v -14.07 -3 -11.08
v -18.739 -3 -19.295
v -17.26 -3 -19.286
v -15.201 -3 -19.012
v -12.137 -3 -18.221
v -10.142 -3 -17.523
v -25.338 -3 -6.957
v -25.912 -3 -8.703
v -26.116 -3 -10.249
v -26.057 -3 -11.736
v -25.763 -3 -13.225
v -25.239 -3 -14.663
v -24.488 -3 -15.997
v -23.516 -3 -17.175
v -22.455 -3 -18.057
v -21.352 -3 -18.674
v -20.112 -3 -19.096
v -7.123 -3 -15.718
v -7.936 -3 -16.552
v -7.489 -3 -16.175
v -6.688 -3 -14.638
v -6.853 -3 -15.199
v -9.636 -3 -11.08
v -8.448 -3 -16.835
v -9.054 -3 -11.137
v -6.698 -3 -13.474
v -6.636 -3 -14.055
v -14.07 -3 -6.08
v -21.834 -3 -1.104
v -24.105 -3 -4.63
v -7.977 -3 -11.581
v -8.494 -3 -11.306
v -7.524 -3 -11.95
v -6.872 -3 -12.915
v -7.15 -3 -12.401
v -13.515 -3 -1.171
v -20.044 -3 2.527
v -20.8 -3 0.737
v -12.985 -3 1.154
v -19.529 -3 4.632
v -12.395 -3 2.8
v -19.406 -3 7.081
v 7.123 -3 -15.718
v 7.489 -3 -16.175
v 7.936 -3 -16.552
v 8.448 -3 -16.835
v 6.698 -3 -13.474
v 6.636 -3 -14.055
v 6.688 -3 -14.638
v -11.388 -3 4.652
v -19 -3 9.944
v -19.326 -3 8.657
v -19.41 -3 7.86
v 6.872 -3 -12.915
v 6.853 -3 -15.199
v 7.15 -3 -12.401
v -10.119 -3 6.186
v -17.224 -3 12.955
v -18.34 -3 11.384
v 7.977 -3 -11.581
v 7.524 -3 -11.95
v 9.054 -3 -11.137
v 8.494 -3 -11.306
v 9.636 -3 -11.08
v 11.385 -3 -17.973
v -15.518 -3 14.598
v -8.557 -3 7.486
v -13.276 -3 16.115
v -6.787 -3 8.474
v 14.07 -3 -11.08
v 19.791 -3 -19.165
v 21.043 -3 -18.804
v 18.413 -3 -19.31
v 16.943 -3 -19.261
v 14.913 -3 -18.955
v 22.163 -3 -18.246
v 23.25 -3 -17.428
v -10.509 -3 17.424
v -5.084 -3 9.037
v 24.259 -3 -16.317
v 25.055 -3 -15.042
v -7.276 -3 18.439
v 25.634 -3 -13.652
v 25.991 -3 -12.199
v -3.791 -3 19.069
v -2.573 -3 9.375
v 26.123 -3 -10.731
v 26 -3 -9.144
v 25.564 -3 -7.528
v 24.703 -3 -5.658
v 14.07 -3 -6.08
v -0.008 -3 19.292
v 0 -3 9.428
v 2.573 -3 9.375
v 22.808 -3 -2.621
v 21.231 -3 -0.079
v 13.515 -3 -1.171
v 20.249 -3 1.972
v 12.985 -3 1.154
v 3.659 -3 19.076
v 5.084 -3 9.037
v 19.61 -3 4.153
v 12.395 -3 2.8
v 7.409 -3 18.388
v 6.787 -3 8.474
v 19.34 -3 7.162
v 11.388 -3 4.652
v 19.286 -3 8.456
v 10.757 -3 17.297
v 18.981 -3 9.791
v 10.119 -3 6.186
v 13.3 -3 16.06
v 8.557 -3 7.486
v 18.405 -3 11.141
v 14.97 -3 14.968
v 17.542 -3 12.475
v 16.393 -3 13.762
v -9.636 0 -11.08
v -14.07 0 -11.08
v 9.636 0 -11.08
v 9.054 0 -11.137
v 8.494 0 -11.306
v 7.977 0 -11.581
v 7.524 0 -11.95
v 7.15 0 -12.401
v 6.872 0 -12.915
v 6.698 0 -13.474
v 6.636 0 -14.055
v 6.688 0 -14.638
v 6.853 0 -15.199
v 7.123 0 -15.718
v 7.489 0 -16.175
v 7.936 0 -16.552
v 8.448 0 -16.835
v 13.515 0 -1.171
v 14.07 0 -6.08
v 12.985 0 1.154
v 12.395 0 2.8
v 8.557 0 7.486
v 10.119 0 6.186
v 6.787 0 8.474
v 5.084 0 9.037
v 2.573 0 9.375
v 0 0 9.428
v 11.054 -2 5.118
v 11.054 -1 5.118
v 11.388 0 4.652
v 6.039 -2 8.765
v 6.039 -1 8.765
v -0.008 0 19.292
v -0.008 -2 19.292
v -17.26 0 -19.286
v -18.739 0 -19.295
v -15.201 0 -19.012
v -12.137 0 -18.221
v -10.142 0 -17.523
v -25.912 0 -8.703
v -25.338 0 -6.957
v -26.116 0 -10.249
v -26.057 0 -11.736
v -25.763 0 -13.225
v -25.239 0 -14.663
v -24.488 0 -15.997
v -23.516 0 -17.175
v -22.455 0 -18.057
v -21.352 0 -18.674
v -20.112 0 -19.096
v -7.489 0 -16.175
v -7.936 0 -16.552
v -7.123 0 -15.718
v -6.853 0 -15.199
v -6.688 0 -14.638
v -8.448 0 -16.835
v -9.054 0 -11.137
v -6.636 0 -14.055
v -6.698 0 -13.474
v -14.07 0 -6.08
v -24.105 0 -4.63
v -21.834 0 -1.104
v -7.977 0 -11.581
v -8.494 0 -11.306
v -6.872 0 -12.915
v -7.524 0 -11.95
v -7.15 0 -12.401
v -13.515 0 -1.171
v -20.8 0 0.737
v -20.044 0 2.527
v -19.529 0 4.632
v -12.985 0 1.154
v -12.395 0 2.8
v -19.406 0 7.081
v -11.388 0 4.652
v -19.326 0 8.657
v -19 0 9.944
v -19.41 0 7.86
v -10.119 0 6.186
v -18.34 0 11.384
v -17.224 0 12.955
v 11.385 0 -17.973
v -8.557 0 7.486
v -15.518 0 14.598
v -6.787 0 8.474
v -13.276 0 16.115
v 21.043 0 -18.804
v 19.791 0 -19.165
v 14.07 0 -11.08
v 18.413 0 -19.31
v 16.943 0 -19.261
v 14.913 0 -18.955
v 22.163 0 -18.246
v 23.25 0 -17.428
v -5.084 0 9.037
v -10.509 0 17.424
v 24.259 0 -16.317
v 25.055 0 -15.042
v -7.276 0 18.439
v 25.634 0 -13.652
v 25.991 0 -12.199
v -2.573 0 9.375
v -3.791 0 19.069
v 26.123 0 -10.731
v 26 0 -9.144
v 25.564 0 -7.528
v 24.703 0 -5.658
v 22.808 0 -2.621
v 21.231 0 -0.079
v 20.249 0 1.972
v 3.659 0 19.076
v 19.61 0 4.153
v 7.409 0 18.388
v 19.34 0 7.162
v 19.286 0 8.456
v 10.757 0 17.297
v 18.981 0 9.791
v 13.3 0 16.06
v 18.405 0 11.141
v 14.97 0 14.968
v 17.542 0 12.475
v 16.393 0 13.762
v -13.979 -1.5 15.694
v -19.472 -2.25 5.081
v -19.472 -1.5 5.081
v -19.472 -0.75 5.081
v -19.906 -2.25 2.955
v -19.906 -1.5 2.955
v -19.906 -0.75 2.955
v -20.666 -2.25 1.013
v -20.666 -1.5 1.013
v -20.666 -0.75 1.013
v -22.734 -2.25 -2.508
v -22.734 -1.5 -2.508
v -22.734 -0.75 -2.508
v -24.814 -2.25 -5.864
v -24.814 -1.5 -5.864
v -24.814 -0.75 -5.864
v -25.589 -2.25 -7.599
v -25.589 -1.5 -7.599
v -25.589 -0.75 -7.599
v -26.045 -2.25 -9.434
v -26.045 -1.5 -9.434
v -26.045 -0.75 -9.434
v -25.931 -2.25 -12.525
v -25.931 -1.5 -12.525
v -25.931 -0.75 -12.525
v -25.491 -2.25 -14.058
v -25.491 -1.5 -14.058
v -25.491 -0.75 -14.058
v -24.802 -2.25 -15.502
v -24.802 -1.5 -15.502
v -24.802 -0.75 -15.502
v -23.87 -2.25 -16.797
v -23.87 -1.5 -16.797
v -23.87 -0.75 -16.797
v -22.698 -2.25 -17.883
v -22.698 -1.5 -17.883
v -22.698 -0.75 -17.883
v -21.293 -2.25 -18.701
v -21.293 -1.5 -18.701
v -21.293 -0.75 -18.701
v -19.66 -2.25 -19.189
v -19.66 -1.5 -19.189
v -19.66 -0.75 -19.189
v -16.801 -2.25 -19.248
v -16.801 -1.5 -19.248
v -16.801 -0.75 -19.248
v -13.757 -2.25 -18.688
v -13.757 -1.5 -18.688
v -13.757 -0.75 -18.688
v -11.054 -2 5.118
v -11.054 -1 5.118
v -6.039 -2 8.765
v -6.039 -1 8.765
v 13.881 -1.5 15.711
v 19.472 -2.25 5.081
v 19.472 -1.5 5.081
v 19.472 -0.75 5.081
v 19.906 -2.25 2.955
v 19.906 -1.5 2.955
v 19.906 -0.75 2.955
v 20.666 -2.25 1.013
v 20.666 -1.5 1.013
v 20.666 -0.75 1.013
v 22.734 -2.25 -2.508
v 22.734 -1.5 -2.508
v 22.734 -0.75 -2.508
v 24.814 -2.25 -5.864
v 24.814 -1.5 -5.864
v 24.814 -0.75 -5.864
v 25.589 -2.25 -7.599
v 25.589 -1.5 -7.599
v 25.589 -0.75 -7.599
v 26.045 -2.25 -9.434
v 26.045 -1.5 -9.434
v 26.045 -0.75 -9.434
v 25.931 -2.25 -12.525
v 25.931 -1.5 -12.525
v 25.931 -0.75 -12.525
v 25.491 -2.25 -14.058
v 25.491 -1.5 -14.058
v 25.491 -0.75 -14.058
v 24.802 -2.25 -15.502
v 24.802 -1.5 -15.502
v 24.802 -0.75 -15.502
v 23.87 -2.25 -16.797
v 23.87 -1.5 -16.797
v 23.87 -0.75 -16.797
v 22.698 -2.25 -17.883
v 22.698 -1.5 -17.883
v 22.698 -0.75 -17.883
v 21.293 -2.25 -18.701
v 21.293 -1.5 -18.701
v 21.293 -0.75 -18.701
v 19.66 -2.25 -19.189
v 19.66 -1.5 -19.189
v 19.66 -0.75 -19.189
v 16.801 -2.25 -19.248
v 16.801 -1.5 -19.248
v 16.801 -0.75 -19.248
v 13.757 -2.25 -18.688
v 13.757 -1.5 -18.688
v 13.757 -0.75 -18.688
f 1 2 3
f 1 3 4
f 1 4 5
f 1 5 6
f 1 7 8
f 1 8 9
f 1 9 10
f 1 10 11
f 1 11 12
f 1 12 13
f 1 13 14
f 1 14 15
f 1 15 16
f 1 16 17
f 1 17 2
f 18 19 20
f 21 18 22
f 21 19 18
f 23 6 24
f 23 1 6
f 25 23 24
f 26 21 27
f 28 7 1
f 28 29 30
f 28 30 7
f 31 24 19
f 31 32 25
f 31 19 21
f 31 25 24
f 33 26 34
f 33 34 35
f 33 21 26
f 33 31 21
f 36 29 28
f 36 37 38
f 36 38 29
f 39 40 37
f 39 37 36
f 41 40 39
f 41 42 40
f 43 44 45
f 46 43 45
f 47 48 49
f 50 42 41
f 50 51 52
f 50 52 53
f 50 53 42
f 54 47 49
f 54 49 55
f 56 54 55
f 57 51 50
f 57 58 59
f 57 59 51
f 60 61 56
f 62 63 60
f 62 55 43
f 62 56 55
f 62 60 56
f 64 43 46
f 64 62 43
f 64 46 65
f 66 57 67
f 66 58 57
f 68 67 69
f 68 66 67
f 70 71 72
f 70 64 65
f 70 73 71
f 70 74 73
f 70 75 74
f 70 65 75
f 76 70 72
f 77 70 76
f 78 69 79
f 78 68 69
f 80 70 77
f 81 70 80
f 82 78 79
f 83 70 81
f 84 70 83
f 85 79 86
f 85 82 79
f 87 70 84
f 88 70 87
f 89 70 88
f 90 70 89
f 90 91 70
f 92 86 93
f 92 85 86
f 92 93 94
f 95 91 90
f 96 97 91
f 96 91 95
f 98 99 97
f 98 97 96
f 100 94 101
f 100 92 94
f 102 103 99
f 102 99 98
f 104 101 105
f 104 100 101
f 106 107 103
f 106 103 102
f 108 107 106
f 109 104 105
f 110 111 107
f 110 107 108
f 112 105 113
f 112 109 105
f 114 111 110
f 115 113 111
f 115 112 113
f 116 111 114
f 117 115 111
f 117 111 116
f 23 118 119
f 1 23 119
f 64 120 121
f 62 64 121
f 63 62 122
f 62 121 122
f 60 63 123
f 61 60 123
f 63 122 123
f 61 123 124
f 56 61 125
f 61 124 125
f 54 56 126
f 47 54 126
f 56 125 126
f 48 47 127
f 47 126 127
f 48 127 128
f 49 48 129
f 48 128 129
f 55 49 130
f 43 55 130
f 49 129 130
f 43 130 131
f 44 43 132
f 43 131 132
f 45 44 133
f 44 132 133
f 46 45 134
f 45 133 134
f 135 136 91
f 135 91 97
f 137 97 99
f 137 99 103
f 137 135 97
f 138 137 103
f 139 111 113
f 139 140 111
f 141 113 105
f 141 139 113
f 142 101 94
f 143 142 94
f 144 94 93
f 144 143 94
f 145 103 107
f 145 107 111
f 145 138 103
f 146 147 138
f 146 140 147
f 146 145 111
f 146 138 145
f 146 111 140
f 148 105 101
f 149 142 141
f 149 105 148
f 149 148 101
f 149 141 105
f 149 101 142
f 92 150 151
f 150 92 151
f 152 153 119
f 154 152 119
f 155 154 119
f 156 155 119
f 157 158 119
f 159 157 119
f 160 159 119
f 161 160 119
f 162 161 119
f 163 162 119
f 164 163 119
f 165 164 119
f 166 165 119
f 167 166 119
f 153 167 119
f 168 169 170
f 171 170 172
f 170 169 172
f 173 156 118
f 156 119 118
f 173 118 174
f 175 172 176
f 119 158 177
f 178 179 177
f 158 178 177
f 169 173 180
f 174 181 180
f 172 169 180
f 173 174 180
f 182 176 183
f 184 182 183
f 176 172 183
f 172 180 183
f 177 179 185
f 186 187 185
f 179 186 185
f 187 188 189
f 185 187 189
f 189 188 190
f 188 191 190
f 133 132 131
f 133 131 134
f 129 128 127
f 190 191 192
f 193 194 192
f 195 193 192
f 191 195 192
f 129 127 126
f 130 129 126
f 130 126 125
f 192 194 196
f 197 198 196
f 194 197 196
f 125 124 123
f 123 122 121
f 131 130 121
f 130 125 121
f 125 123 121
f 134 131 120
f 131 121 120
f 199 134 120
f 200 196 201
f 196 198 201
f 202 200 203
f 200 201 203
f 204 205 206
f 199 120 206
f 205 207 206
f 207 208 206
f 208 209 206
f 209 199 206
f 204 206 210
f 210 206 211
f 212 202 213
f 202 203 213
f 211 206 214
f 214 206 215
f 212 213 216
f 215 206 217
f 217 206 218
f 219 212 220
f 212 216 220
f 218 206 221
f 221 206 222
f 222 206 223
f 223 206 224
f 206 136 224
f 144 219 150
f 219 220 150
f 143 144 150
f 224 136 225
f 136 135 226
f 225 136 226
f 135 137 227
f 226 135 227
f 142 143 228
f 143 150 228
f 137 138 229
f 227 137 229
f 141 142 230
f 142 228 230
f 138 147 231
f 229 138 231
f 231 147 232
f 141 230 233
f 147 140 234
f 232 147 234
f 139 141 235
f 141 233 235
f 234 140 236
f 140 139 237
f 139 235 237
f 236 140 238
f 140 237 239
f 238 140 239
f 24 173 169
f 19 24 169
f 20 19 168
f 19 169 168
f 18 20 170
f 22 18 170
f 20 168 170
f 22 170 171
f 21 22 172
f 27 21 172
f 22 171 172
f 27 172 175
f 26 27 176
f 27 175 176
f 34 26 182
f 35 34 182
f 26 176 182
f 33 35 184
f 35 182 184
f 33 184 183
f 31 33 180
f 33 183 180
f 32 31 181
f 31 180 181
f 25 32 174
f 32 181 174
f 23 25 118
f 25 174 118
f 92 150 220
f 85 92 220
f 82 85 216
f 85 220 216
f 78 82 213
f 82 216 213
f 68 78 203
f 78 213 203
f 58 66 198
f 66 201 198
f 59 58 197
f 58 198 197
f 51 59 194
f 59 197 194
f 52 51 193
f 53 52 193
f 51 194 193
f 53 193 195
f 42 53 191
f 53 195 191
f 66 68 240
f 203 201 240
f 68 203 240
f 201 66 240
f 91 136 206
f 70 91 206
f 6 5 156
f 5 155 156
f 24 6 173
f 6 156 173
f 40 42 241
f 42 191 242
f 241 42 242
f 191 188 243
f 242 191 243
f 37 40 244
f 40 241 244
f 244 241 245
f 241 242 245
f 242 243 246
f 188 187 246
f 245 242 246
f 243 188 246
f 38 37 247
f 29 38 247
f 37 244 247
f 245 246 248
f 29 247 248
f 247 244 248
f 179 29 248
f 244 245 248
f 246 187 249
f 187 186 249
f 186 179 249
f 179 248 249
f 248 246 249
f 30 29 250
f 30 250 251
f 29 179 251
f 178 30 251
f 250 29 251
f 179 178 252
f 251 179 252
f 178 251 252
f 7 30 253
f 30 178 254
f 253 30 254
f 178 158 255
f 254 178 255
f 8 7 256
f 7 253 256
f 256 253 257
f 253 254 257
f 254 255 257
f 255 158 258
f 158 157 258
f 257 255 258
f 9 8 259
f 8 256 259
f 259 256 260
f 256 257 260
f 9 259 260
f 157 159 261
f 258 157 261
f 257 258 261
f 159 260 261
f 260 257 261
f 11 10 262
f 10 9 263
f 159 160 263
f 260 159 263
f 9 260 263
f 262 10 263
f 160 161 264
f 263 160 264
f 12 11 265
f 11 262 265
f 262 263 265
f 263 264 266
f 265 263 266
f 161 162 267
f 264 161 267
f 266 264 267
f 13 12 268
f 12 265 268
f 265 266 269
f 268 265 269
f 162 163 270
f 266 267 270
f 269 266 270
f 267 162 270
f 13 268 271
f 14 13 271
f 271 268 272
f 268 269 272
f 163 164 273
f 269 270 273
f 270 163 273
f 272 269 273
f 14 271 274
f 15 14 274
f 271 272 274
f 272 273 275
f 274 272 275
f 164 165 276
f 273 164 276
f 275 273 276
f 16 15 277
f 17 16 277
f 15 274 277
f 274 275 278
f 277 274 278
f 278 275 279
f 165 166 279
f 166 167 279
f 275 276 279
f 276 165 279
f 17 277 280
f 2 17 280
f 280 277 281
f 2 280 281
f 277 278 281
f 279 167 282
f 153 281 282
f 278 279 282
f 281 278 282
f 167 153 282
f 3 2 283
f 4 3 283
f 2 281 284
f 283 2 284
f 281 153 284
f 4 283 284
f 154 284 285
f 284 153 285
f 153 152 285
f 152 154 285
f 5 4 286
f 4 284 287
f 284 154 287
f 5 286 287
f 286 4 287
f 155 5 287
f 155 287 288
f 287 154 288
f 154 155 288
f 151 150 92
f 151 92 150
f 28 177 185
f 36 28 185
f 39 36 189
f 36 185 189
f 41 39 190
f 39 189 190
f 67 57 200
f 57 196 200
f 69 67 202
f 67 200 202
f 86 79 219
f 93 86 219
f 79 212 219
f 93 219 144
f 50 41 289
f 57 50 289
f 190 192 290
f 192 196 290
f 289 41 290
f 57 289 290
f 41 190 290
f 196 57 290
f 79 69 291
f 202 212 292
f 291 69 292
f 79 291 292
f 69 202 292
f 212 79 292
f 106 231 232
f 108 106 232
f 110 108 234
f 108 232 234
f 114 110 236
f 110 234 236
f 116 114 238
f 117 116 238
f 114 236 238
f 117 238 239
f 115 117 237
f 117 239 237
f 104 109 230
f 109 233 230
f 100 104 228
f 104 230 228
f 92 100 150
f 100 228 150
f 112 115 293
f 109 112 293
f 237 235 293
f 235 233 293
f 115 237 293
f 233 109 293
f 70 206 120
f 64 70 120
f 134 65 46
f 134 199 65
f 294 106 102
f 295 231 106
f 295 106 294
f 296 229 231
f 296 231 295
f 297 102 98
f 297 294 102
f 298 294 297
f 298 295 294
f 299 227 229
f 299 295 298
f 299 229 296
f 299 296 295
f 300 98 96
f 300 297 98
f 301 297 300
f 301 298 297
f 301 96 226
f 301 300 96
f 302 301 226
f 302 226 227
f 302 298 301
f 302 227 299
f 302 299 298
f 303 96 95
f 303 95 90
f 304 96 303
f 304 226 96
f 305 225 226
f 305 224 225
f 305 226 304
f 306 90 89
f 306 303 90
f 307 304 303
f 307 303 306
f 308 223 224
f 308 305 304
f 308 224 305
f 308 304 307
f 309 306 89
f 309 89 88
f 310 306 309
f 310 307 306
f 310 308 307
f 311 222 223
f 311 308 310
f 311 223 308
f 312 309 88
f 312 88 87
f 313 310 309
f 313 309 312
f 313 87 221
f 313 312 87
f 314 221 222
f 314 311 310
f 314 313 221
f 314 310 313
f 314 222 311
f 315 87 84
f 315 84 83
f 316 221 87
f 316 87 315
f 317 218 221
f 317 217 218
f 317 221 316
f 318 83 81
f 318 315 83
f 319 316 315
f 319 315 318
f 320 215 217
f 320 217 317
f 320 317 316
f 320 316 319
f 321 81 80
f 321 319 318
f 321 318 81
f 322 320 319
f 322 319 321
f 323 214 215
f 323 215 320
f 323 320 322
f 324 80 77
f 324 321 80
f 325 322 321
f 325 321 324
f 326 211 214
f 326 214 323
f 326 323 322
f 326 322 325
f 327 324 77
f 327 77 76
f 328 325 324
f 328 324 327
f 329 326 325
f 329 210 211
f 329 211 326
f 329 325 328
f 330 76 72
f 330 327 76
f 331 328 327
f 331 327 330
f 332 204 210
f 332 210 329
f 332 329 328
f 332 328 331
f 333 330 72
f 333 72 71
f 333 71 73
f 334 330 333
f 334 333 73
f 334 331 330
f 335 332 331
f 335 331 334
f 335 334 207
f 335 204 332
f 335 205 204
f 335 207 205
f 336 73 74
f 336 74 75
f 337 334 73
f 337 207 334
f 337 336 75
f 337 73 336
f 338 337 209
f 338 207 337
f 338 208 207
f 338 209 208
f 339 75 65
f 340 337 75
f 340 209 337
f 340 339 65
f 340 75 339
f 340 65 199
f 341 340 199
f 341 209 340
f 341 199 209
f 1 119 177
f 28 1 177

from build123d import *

# Parameters (mm, degrees)
F1_DEPTH = 3


# Not quite as in the source:
# - ends of sketch curves that miss each other by under 0.0002 mm in the source are joined
# - the dataset's text gives a spline's control points without its knots; the knots are read off the source's solid


with BuildPart() as f1:
    # F0 (on Front) → F1 (new body)
    with BuildSketch(Plane.XZ):
        with BuildLine():
            Line((-9.636137, -11.080088), (-14.07, -11.080088))
            Line((-14.07, -11.080088), (-14.07, -6.080088))
            add(Edge.make_bspline(
                [(-14.07, -6.080088), (-13.725678, -2.009613), (-13.197272, 4.237053), (-6.222695, 9.414593), (-2.060159, 9.423293), (0, 9.427599)],
                knots=[0, 0, 0, 0, 11.597106, 17.797245, 23.872878, 23.872878, 23.872878, 23.872878], degree=3))
            add(Edge.make_bspline(
                [(14.07, -6.080088), (13.725679, -2.009613), (13.197273, 4.237053), (6.222696, 9.414593), (2.06016, 9.423293), (0, 9.427599)],
                knots=[0, 0, 0, 0, 11.597106, 17.797245, 23.872878, 23.872878, 23.872878, 23.872878], degree=3))
            Line((14.07, -6.080088), (14.07, -11.080088))
            Line((14.07, -11.080088), (9.636138, -11.080088))
            ThreePointArc((9.636138, -11.080088), (6.6980962866, -13.4735314153), (8.4480789685, -16.8348140731))
            add(Edge.make_bspline(
                [(19.339969, 7.161527), (19.387769, 6.678303), (19.412006, -0.419852), (29.48044, -7.102045), (22.588634, -22.151196), (11.198451, -18.020996), (8.4480789685, -16.8348140731)],
                knots=[26.688985, 26.688985, 26.688985, 26.688985, 28.557776, 42.872008, 54.1154, 62.665306, 62.665306, 62.665306, 62.665306], degree=3))
            add(Edge.make_bspline(
                [(19.339969, 7.161527), (19.9265814181, 19.2748150047), (-0.0078359998, 19.2919222589)],
                knots=[6.253754, 6.253754, 6.253754, 7.8525699735, 7.8525699735, 7.8525699735], degree=2, weights=[1, 0.6971312715, 1]))
            add(Edge.make_bspline(
                [(-0.008117, 19.291903), (-0.008023, 19.291909), (-0.007929, 19.291915), (-0.0078359998, 19.2919222589)],
                knots=[0, 0, 0, 0, 1, 1, 1, 1], degree=3))
            add(Edge.make_bspline(
                [(-0.008117, 19.291903), (-0.008221, 19.291909), (-0.008326, 19.291916), (-0.008431, 19.291922)],
                knots=[0, 0, 0, 0, 1, 1, 1, 1], degree=3))
            add(Edge.make_bspline(
                [(-0.008431, 19.291922), (-20.136683318, 19.3088207532), (-19.4059855754, 7.0805132175)],
                knots=[1.5694153625, 1.5694153625, 1.5694153625, 3.1779026928, 3.1779026928, 3.1779026928], degree=2, weights=[1, 0.693656226, 1]))
            add(Edge.make_bspline(
                [(-19.4059855754, 7.0805132175), (-19.387768, 6.678303), (-19.412005, -0.419852), (-29.48044, -7.102045), (-22.588633, -22.151196), (-11.19845, -18.020996), (-8.448078, -16.834814)],
                knots=[26.688985, 26.688985, 26.688985, 26.688985, 28.557776, 42.872008, 54.1154, 62.665306, 62.665306, 62.665306, 62.665306], degree=3))
            ThreePointArc((-8.448078, -16.834814), (-6.6980952866, -13.4735314153), (-9.636137, -11.080088))
        make_face()
    extrude(amount=F1_DEPTH)


solid = f1.part
